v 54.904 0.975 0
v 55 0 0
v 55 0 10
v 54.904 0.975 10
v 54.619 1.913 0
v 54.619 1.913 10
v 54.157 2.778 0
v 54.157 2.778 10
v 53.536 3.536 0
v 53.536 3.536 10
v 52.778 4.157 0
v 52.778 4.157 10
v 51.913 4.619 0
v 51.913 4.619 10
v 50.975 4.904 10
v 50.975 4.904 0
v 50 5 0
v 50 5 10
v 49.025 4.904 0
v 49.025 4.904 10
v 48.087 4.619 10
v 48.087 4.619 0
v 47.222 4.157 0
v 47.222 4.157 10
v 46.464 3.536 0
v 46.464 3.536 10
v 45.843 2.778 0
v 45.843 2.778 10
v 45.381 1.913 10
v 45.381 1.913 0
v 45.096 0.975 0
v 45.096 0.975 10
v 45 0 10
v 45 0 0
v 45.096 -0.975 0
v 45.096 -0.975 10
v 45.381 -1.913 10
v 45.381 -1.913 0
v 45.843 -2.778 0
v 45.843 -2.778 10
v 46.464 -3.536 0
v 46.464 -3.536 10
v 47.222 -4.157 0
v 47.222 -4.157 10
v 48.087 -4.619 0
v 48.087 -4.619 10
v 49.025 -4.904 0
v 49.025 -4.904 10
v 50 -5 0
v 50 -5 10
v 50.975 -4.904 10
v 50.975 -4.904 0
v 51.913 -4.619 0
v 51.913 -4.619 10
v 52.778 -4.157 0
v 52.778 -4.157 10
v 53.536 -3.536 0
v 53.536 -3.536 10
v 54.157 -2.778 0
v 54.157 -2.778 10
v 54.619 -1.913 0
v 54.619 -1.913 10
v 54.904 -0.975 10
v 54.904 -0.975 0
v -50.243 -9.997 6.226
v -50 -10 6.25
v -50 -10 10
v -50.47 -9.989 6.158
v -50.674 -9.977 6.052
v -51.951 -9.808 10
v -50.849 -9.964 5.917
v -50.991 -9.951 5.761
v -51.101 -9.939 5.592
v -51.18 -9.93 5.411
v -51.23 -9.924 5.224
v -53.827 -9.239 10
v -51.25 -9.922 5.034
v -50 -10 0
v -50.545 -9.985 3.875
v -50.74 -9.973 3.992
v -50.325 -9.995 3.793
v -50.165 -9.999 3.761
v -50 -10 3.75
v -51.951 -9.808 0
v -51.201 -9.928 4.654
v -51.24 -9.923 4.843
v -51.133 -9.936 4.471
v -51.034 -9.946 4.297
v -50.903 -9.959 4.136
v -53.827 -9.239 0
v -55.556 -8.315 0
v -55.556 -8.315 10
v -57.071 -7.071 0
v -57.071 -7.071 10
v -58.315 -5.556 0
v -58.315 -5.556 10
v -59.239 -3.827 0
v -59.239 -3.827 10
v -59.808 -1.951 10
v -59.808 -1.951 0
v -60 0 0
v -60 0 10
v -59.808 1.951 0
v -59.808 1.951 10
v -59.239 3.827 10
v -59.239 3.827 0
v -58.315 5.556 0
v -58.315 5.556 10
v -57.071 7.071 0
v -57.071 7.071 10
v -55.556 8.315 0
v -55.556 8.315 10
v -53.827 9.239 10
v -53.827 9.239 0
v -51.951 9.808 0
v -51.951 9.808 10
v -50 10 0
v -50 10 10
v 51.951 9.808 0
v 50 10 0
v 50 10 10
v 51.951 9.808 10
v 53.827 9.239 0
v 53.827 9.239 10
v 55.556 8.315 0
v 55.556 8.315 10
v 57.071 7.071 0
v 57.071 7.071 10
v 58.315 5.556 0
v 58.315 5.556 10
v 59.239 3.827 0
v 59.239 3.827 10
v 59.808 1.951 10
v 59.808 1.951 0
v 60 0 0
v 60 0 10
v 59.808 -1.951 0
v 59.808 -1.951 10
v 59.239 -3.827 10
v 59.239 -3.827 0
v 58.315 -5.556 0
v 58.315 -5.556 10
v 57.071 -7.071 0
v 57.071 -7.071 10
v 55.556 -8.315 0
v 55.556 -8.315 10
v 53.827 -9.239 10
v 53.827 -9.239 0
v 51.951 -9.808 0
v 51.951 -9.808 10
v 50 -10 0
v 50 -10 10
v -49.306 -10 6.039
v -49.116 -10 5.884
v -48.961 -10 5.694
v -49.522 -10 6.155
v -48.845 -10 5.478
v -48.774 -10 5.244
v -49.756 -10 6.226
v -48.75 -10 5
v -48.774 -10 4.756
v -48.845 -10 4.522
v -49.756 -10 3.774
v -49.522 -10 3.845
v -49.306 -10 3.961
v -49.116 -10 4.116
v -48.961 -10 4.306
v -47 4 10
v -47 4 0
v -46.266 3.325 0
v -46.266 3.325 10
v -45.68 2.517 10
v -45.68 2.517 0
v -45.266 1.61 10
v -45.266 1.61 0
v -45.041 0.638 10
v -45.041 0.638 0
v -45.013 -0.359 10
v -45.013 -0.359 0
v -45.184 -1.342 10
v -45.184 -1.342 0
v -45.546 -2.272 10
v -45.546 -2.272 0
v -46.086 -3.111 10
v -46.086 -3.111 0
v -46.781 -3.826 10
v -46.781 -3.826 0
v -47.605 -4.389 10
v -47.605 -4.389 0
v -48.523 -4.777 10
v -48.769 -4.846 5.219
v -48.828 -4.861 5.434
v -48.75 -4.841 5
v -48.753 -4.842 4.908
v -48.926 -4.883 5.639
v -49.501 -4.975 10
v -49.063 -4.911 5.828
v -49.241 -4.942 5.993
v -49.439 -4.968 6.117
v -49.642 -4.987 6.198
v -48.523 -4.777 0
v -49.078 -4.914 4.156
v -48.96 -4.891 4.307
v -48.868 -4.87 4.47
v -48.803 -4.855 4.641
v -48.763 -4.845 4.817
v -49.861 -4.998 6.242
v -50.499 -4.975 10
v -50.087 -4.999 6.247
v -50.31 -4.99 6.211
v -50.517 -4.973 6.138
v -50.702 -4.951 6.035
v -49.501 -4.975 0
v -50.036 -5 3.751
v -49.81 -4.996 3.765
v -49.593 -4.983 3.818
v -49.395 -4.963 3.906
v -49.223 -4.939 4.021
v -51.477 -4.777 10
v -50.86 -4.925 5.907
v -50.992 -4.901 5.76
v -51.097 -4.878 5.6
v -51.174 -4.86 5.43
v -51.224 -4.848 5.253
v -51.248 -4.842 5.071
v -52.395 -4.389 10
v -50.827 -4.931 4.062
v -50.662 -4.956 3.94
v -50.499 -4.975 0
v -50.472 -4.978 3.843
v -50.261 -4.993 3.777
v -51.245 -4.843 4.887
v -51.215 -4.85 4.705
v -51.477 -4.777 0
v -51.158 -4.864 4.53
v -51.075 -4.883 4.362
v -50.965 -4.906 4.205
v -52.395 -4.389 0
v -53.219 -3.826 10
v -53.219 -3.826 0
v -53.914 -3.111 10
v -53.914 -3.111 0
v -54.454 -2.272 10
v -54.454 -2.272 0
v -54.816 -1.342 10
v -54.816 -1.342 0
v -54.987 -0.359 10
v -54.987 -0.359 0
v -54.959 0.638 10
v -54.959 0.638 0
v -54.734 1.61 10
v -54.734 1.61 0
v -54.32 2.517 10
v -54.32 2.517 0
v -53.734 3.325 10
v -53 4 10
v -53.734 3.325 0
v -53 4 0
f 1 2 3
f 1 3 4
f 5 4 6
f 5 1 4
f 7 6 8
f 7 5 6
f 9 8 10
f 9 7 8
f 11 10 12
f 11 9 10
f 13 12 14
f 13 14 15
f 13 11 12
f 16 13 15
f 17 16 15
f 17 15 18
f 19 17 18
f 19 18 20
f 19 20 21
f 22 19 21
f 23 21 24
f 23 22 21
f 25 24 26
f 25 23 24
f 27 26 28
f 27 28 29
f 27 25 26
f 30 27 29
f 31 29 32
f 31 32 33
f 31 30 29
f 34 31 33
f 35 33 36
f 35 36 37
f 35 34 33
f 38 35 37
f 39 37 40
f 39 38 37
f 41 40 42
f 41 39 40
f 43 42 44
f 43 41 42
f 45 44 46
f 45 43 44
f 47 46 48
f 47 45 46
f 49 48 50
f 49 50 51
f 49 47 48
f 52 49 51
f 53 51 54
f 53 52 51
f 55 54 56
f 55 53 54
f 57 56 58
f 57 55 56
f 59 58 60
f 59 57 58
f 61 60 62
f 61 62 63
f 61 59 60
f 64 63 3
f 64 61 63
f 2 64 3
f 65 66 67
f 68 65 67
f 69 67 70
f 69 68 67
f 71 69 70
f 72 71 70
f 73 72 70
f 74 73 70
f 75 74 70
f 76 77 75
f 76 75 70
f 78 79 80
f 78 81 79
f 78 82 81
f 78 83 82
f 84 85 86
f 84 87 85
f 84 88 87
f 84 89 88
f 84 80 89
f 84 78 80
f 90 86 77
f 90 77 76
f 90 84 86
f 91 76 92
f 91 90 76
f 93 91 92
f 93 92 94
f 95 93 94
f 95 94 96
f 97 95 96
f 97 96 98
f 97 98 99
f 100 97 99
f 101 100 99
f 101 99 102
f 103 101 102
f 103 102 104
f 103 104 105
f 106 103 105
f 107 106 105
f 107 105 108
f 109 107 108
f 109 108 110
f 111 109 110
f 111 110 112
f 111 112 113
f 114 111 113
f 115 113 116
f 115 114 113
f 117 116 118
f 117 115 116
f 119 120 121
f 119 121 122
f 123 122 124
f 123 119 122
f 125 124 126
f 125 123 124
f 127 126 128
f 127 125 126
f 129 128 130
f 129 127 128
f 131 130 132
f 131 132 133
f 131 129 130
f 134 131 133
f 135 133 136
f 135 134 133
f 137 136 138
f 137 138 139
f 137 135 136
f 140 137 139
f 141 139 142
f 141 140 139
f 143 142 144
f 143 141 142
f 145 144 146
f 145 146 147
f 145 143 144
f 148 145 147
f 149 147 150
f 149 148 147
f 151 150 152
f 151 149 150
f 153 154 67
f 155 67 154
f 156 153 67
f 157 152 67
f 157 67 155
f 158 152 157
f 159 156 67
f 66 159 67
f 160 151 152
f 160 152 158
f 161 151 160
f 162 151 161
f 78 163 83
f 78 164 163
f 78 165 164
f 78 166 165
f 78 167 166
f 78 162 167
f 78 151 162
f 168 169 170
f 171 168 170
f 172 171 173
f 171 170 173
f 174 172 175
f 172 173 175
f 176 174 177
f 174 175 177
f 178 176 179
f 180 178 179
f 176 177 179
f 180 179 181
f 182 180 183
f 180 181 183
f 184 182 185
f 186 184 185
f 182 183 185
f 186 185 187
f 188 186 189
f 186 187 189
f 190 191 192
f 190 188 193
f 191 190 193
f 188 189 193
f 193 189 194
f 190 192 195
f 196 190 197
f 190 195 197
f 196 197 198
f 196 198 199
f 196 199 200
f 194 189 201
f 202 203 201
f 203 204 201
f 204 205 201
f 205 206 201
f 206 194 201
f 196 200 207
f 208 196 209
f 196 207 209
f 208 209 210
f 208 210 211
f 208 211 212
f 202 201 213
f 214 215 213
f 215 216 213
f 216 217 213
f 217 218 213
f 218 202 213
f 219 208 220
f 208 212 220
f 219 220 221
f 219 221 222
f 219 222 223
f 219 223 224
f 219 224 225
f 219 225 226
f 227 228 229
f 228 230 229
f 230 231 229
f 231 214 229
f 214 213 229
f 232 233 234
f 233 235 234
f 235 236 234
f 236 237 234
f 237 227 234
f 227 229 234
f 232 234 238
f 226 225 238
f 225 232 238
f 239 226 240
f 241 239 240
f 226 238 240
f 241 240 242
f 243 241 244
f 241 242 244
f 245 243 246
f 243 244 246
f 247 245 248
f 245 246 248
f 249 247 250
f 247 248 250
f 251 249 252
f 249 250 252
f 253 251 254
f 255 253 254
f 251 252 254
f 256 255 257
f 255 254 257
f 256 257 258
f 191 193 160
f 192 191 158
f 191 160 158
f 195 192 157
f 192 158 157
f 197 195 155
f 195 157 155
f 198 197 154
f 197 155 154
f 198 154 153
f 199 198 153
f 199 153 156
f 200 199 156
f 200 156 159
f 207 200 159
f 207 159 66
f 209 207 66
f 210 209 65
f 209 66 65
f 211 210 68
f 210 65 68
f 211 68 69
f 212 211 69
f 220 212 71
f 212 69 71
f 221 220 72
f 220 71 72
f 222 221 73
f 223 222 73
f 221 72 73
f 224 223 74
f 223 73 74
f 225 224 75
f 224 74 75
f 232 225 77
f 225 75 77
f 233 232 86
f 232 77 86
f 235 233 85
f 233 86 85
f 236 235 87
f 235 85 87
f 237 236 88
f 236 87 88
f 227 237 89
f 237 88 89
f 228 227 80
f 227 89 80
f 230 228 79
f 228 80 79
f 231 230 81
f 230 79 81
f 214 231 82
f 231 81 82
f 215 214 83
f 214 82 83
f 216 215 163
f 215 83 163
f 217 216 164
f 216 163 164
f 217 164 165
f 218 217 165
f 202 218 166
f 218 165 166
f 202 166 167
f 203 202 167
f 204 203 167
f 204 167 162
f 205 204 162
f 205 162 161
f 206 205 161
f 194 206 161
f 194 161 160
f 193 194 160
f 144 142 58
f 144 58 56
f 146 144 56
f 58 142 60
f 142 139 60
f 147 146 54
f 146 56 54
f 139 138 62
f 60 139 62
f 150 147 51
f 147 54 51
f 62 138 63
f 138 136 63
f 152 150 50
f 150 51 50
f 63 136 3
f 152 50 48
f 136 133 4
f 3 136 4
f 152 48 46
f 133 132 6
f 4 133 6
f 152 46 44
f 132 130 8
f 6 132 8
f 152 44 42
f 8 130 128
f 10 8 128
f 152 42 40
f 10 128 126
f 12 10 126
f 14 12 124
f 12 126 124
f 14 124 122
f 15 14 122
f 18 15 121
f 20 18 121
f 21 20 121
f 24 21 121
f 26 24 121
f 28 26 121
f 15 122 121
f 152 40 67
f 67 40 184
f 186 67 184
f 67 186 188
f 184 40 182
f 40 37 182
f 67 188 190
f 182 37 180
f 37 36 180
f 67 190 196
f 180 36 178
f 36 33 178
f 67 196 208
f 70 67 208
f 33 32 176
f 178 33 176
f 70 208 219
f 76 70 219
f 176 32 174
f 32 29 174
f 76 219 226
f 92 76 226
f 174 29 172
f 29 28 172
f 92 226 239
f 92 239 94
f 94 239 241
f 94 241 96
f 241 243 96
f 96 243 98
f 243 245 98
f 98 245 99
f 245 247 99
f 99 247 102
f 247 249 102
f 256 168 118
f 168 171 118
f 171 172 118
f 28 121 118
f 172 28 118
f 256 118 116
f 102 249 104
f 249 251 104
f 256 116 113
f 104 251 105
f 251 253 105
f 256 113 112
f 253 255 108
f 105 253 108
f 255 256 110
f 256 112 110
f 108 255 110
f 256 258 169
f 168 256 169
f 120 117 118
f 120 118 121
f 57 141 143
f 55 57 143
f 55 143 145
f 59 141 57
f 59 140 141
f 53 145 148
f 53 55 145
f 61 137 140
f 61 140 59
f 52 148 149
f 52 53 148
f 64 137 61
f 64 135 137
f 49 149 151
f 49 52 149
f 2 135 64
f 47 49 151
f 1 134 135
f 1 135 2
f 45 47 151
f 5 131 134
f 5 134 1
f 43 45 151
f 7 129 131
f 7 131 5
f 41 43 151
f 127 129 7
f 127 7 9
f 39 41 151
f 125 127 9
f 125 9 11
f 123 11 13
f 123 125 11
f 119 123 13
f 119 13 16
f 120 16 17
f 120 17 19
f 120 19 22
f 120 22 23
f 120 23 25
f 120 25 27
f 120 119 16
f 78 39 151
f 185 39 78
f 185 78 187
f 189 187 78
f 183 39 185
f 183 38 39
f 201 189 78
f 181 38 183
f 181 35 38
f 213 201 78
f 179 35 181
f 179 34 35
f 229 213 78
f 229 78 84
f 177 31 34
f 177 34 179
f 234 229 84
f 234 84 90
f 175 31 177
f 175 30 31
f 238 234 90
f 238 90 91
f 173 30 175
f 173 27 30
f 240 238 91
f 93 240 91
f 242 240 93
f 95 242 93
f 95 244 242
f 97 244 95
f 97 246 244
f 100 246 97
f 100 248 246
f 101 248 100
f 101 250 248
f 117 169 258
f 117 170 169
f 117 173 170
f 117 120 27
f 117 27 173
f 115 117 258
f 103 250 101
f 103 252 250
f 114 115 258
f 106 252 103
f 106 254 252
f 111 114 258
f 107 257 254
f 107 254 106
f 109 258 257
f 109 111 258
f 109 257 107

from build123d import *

# Parameters (mm, degrees)
SKETCH_1_R          = 5
EXTRUDE_1_DEPTH     = 10
SKETCH_2_R          = 1.25
CUT_EXTRUDE_1_DEPTH = 10


with BuildPart() as part:
    # 草图1 → 凸台-拉伸1 (new body)
    with BuildSketch(Plane.XY):
        with BuildLine():
            Line((-50, 10), (50, 10))
            ThreePointArc((50, 10), (60, 0), (50, -10))
            Line((50, -10), (-50, -10))
            ThreePointArc((-50, -10), (-60, 0), (-50, 10))
        make_face()
        with Locations((50, 0)):
            Circle(SKETCH_1_R, mode=Mode.SUBTRACT)
        with BuildLine():
            Line((-53, 4), (-47, 4))
            ThreePointArc((-47, 4), (-50, -5), (-53, 4))
        make_face(mode=Mode.SUBTRACT)
    extrude(amount=EXTRUDE_1_DEPTH)

    # 草图2 → 切除-拉伸1 (cut)
    with BuildSketch(Plane.XZ.offset(10)):
        with Locations((-50, 5)):
            Circle(SKETCH_2_R)
    extrude(amount=-CUT_EXTRUDE_1_DEPTH, mode=Mode.SUBTRACT)


solid = part.part
